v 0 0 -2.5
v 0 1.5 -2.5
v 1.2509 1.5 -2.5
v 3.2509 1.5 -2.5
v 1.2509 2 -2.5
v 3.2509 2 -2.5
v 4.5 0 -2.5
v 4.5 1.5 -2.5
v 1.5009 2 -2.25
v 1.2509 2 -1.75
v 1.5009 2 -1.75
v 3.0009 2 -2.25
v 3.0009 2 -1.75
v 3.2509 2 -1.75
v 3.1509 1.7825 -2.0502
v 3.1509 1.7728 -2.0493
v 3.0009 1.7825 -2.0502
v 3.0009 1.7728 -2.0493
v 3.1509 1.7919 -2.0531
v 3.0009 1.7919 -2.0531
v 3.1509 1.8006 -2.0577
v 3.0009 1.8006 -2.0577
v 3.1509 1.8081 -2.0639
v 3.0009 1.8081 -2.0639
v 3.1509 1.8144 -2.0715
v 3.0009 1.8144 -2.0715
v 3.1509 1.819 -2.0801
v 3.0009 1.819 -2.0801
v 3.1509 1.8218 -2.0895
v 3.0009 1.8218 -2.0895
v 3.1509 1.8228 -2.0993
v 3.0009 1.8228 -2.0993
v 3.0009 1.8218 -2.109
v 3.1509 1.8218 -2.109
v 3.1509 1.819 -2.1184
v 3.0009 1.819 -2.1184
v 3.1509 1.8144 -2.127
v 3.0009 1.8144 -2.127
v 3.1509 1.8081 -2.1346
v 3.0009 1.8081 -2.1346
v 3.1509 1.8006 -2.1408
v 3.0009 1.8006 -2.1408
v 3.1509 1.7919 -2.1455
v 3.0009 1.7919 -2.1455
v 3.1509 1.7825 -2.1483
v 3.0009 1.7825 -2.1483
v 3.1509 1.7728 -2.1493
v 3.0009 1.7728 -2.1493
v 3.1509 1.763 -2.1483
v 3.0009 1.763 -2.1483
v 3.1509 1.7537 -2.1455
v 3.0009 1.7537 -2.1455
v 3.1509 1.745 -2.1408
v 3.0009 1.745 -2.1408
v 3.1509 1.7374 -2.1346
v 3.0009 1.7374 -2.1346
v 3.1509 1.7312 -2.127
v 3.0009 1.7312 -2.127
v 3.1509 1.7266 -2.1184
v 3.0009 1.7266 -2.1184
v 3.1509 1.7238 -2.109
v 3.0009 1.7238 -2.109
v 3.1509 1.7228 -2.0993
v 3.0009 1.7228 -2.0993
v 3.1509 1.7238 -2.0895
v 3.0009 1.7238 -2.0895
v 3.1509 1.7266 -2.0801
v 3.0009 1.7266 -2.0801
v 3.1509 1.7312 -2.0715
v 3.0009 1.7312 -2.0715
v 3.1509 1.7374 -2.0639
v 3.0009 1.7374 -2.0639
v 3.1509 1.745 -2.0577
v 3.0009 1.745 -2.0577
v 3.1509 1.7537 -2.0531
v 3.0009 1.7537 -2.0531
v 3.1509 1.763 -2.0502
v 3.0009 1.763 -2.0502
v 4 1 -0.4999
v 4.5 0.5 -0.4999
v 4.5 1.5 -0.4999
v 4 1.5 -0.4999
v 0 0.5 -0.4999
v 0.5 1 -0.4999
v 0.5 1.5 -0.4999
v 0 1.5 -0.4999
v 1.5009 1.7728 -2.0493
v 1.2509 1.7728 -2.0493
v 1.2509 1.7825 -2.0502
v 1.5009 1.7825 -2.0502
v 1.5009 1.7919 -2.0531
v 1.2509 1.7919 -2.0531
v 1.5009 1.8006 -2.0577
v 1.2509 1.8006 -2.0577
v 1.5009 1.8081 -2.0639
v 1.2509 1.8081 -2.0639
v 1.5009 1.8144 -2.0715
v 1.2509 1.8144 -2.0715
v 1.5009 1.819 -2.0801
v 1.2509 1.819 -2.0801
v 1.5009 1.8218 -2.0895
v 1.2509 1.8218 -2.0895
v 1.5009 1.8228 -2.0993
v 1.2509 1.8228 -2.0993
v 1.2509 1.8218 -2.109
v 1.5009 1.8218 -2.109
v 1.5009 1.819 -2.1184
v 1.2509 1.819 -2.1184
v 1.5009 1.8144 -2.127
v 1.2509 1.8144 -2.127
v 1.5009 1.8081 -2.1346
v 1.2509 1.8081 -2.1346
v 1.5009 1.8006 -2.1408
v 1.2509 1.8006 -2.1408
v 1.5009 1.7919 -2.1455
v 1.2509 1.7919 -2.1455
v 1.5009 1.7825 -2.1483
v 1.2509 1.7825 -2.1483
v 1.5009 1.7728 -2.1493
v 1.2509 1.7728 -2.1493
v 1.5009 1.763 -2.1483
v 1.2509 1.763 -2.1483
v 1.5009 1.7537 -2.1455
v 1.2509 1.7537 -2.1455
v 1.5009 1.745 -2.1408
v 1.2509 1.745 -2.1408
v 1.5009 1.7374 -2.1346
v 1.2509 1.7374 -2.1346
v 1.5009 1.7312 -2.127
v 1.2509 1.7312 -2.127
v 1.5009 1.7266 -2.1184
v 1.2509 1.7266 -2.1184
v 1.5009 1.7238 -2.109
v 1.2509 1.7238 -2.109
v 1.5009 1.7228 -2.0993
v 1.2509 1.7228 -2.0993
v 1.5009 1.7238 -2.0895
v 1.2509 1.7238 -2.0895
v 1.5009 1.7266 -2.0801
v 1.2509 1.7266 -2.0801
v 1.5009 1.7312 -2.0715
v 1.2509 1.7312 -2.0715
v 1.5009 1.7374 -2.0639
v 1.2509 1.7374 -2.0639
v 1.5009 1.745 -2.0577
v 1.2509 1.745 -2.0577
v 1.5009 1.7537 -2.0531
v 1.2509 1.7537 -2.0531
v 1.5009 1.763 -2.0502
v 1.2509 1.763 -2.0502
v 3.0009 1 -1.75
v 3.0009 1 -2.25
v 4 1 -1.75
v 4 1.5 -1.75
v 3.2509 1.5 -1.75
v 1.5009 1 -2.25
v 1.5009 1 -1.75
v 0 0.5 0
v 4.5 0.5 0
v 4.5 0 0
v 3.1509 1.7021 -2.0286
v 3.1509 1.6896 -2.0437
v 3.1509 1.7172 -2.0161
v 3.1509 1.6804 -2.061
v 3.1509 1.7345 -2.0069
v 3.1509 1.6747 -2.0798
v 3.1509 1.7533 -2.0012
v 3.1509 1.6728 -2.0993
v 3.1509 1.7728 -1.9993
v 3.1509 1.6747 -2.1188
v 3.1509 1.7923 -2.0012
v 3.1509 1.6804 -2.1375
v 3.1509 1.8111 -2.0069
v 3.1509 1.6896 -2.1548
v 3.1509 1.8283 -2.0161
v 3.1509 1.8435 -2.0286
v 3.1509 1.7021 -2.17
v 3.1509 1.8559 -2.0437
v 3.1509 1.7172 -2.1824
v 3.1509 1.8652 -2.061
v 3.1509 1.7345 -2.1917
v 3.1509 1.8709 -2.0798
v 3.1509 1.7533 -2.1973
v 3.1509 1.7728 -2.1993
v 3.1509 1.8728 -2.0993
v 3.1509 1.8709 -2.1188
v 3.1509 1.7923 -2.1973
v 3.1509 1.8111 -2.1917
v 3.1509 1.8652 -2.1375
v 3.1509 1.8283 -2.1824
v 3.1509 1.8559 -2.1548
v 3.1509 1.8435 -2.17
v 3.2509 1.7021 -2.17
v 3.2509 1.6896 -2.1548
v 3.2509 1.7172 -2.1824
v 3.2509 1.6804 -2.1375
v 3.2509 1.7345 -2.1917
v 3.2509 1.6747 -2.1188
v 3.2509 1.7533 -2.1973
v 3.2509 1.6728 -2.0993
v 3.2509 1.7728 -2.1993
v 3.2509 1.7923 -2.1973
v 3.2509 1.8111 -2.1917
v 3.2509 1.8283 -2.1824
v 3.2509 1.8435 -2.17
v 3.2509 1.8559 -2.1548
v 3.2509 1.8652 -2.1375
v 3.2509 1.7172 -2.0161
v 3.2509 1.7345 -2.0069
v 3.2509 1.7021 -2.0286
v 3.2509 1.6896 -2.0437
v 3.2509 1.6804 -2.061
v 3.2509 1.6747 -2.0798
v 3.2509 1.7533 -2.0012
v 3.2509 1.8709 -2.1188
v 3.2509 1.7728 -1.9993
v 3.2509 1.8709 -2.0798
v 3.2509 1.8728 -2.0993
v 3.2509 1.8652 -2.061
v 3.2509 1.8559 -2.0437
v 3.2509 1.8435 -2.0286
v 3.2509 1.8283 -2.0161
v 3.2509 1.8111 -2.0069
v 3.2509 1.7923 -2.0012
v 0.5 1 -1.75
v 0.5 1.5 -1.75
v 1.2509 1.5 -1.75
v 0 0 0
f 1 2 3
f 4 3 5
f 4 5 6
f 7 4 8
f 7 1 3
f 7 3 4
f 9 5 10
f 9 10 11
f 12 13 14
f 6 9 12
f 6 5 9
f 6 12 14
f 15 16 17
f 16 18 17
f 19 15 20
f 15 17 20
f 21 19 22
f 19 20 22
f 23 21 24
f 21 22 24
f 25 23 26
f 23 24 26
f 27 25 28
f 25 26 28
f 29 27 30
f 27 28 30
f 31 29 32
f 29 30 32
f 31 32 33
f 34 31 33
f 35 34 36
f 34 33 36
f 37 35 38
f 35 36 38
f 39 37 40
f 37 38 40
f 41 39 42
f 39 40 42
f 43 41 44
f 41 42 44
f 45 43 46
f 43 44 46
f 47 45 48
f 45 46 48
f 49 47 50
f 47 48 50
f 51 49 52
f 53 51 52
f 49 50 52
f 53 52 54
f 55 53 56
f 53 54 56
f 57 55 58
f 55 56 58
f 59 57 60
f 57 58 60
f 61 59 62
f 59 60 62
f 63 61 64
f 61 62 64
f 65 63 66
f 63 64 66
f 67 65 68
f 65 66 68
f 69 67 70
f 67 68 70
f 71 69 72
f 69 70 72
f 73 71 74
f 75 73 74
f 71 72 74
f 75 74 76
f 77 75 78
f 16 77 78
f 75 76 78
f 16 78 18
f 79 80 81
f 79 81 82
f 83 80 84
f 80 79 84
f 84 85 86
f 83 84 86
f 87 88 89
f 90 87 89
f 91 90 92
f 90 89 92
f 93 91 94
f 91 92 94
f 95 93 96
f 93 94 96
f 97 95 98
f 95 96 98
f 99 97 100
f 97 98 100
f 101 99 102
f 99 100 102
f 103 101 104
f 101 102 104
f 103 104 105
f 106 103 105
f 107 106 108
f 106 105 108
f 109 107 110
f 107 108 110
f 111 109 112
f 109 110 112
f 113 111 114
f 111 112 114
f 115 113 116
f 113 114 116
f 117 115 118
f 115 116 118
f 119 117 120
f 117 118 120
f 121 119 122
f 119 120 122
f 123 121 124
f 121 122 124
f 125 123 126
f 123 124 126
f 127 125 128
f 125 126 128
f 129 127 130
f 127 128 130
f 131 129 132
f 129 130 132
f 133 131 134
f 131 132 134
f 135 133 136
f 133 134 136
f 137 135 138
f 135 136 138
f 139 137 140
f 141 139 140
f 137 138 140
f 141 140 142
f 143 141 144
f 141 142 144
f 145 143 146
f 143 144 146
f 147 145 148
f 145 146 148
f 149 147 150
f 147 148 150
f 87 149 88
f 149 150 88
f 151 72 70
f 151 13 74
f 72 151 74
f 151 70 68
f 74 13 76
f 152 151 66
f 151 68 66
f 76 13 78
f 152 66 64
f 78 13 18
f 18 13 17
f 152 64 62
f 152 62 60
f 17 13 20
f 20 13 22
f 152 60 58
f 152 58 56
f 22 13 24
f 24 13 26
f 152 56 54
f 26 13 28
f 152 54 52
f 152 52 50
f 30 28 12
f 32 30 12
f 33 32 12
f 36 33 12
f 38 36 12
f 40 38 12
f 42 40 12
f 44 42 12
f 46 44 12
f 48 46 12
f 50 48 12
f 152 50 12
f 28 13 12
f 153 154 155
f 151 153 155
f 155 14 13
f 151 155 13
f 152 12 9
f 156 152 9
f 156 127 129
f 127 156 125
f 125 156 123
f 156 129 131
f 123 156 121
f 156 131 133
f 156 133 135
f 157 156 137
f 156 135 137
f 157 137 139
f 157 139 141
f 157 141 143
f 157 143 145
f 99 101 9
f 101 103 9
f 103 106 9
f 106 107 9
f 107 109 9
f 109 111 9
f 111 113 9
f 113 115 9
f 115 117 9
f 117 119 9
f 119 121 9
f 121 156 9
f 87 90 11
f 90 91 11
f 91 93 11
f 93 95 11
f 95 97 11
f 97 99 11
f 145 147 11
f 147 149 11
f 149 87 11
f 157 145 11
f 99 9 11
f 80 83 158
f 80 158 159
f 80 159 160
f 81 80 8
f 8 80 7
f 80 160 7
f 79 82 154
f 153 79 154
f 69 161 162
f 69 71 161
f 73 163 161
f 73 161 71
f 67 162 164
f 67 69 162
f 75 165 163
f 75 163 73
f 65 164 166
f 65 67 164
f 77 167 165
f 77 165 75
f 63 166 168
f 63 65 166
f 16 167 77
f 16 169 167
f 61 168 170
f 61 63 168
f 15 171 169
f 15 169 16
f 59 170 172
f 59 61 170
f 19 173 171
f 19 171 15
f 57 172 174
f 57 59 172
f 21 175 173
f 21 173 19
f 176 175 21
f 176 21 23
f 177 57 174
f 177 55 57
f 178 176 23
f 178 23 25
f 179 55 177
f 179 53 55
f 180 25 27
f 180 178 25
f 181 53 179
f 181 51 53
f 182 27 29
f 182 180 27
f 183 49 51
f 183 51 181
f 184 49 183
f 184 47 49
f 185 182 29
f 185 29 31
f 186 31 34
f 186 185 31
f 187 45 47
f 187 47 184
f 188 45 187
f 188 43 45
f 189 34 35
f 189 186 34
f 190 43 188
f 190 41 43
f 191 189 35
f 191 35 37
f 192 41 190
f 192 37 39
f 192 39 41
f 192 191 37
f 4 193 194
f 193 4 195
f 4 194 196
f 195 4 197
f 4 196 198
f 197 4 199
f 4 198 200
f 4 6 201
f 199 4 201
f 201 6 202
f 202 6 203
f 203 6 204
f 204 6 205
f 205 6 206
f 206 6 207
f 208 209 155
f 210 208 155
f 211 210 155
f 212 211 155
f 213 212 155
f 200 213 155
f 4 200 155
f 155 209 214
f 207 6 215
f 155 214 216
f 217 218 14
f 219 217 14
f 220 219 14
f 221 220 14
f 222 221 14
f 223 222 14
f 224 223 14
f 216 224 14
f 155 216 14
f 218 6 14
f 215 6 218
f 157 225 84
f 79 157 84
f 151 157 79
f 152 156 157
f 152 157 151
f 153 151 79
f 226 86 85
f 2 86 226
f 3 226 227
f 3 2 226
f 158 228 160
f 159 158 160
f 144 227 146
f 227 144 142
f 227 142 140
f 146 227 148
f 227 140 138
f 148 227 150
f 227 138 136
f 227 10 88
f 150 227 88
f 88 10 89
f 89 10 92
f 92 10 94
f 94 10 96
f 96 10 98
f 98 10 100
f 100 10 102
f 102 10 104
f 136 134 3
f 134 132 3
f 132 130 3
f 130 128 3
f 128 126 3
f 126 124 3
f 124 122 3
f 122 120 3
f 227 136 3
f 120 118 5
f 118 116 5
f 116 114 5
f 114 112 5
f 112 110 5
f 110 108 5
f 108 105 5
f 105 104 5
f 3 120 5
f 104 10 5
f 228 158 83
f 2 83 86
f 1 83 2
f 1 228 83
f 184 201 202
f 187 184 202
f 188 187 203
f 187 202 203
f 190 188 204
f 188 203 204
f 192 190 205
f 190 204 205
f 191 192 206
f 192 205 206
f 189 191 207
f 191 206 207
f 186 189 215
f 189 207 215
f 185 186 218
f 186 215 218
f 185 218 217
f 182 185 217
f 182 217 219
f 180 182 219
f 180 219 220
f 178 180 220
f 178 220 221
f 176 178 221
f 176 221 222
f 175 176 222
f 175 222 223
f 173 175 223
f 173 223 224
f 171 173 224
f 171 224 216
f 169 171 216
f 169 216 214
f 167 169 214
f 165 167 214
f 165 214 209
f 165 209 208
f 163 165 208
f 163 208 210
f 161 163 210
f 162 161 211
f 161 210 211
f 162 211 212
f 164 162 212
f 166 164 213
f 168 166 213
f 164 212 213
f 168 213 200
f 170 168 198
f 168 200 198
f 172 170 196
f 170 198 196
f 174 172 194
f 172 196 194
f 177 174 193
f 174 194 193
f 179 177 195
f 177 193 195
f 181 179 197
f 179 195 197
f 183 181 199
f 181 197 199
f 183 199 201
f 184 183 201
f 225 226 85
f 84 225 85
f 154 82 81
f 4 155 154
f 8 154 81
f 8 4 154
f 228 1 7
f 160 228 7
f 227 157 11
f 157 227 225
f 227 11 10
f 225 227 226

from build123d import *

# Parameters (mm, degrees)
SKETCH2_W                                        = 4.5
SKETCH2_H                                        = 2.5
BOSS_EXTRUDE1_DEPTH                              = 2
CUT_EXTRUDE3_DEPTH                               = 0.5
CUT_EXTRUDE5_DEPTH                               = 0.5
CUT_EXTRUDE6_DEPTH                               = 1
CBORE_FOR_M2_HEX_HEAD_MACHINE_SCREW1_D           = 0.1
CBORE_FOR_M2_HEX_HEAD_MACHINE_SCREW1_DEPTH       = 2
CBORE_FOR_M2_HEX_HEAD_MACHINE_SCREW1_CBORE_D     = 0.2
CBORE_FOR_M2_HEX_HEAD_MACHINE_SCREW1_CBORE_DEPTH = 0.1
CBORE_FOR_M2_HEX_HEAD_MACHINE_SCREW1_TIP         = 0.030043031


with BuildPart() as part:
    # Sketch2 → Boss-Extrude1 (new body)
    with BuildSketch(Plane(origin=(0, 0, 0), x_dir=(1, 0, 0), z_dir=(0, 1, 0))):
        with Locations((2.25, 1.25)):
            Rectangle(SKETCH2_W, SKETCH2_H)
    extrude(amount=BOSS_EXTRUDE1_DEPTH)

    # Sketch6 → Cut-Extrude3 (cut)
    with BuildSketch(Plane(origin=(0, 2, 0), x_dir=(1, 0, 0), z_dir=(0, 1, 0))):
        Polygon((3.000874861, 2.25), (1.500874861, 2.25), (1.500874861, 1.75), (1.250874861, 1.75), (1.250874861, 2.5), (0, 2.5), (0, 0), (4.5, 0), (4.5, 2.5), (3.250874861, 2.5), (3.250874861, 1.75), (3.000874861, 1.75), align=None)
    extrude(amount=-CUT_EXTRUDE3_DEPTH, mode=Mode.SUBTRACT)

    # Sketch9 → Cut-Extrude5 (cut)
    with BuildSketch(Plane(origin=(0, 1.5, 0), x_dir=(1, 0, 0), z_dir=(0, 1, 0))):
        Polygon((0.5, 1.75), (0.5, 0.499892289), (4, 0.499892289), (4, 1.75), (3.000874861, 1.75), (3.000874861, 2.25), (1.500874861, 2.25), (1.500874861, 1.75), align=None)
    extrude(amount=-CUT_EXTRUDE5_DEPTH, mode=Mode.SUBTRACT)

    # Sketch10 → Cut-Extrude6 (cut)
    with BuildSketch(Plane(origin=(0, 1.5, 0), x_dir=(1, 0, 0), z_dir=(0, 1, 0))):
        Polygon((0.5, 0.499892289), (0, 0.499892289), (0, 0), (4.5, 0), (4.5, 0.499892289), align=None)
    extrude(amount=-CUT_EXTRUDE6_DEPTH, mode=Mode.SUBTRACT)

    # CBORE for M2 Hex Head Machine Screw1
    with Locations(Plane(origin=(3.250874861, 0, 0), x_dir=(0, 0, -1), z_dir=(1, 0, 0))):
        with Locations((2.099262102, 1.772792527)):
            CounterBoreHole(CBORE_FOR_M2_HEX_HEAD_MACHINE_SCREW1_D / 2, CBORE_FOR_M2_HEX_HEAD_MACHINE_SCREW1_CBORE_D / 2, CBORE_FOR_M2_HEX_HEAD_MACHINE_SCREW1_CBORE_DEPTH, depth=CBORE_FOR_M2_HEX_HEAD_MACHINE_SCREW1_DEPTH)
            with Locations((0, 0, -(CBORE_FOR_M2_HEX_HEAD_MACHINE_SCREW1_DEPTH + CBORE_FOR_M2_HEX_HEAD_MACHINE_SCREW1_TIP / 2))):  # 118° drill point
                Cone(0, CBORE_FOR_M2_HEX_HEAD_MACHINE_SCREW1_D / 2, CBORE_FOR_M2_HEX_HEAD_MACHINE_SCREW1_TIP, mode=Mode.SUBTRACT)


solid = part.part
